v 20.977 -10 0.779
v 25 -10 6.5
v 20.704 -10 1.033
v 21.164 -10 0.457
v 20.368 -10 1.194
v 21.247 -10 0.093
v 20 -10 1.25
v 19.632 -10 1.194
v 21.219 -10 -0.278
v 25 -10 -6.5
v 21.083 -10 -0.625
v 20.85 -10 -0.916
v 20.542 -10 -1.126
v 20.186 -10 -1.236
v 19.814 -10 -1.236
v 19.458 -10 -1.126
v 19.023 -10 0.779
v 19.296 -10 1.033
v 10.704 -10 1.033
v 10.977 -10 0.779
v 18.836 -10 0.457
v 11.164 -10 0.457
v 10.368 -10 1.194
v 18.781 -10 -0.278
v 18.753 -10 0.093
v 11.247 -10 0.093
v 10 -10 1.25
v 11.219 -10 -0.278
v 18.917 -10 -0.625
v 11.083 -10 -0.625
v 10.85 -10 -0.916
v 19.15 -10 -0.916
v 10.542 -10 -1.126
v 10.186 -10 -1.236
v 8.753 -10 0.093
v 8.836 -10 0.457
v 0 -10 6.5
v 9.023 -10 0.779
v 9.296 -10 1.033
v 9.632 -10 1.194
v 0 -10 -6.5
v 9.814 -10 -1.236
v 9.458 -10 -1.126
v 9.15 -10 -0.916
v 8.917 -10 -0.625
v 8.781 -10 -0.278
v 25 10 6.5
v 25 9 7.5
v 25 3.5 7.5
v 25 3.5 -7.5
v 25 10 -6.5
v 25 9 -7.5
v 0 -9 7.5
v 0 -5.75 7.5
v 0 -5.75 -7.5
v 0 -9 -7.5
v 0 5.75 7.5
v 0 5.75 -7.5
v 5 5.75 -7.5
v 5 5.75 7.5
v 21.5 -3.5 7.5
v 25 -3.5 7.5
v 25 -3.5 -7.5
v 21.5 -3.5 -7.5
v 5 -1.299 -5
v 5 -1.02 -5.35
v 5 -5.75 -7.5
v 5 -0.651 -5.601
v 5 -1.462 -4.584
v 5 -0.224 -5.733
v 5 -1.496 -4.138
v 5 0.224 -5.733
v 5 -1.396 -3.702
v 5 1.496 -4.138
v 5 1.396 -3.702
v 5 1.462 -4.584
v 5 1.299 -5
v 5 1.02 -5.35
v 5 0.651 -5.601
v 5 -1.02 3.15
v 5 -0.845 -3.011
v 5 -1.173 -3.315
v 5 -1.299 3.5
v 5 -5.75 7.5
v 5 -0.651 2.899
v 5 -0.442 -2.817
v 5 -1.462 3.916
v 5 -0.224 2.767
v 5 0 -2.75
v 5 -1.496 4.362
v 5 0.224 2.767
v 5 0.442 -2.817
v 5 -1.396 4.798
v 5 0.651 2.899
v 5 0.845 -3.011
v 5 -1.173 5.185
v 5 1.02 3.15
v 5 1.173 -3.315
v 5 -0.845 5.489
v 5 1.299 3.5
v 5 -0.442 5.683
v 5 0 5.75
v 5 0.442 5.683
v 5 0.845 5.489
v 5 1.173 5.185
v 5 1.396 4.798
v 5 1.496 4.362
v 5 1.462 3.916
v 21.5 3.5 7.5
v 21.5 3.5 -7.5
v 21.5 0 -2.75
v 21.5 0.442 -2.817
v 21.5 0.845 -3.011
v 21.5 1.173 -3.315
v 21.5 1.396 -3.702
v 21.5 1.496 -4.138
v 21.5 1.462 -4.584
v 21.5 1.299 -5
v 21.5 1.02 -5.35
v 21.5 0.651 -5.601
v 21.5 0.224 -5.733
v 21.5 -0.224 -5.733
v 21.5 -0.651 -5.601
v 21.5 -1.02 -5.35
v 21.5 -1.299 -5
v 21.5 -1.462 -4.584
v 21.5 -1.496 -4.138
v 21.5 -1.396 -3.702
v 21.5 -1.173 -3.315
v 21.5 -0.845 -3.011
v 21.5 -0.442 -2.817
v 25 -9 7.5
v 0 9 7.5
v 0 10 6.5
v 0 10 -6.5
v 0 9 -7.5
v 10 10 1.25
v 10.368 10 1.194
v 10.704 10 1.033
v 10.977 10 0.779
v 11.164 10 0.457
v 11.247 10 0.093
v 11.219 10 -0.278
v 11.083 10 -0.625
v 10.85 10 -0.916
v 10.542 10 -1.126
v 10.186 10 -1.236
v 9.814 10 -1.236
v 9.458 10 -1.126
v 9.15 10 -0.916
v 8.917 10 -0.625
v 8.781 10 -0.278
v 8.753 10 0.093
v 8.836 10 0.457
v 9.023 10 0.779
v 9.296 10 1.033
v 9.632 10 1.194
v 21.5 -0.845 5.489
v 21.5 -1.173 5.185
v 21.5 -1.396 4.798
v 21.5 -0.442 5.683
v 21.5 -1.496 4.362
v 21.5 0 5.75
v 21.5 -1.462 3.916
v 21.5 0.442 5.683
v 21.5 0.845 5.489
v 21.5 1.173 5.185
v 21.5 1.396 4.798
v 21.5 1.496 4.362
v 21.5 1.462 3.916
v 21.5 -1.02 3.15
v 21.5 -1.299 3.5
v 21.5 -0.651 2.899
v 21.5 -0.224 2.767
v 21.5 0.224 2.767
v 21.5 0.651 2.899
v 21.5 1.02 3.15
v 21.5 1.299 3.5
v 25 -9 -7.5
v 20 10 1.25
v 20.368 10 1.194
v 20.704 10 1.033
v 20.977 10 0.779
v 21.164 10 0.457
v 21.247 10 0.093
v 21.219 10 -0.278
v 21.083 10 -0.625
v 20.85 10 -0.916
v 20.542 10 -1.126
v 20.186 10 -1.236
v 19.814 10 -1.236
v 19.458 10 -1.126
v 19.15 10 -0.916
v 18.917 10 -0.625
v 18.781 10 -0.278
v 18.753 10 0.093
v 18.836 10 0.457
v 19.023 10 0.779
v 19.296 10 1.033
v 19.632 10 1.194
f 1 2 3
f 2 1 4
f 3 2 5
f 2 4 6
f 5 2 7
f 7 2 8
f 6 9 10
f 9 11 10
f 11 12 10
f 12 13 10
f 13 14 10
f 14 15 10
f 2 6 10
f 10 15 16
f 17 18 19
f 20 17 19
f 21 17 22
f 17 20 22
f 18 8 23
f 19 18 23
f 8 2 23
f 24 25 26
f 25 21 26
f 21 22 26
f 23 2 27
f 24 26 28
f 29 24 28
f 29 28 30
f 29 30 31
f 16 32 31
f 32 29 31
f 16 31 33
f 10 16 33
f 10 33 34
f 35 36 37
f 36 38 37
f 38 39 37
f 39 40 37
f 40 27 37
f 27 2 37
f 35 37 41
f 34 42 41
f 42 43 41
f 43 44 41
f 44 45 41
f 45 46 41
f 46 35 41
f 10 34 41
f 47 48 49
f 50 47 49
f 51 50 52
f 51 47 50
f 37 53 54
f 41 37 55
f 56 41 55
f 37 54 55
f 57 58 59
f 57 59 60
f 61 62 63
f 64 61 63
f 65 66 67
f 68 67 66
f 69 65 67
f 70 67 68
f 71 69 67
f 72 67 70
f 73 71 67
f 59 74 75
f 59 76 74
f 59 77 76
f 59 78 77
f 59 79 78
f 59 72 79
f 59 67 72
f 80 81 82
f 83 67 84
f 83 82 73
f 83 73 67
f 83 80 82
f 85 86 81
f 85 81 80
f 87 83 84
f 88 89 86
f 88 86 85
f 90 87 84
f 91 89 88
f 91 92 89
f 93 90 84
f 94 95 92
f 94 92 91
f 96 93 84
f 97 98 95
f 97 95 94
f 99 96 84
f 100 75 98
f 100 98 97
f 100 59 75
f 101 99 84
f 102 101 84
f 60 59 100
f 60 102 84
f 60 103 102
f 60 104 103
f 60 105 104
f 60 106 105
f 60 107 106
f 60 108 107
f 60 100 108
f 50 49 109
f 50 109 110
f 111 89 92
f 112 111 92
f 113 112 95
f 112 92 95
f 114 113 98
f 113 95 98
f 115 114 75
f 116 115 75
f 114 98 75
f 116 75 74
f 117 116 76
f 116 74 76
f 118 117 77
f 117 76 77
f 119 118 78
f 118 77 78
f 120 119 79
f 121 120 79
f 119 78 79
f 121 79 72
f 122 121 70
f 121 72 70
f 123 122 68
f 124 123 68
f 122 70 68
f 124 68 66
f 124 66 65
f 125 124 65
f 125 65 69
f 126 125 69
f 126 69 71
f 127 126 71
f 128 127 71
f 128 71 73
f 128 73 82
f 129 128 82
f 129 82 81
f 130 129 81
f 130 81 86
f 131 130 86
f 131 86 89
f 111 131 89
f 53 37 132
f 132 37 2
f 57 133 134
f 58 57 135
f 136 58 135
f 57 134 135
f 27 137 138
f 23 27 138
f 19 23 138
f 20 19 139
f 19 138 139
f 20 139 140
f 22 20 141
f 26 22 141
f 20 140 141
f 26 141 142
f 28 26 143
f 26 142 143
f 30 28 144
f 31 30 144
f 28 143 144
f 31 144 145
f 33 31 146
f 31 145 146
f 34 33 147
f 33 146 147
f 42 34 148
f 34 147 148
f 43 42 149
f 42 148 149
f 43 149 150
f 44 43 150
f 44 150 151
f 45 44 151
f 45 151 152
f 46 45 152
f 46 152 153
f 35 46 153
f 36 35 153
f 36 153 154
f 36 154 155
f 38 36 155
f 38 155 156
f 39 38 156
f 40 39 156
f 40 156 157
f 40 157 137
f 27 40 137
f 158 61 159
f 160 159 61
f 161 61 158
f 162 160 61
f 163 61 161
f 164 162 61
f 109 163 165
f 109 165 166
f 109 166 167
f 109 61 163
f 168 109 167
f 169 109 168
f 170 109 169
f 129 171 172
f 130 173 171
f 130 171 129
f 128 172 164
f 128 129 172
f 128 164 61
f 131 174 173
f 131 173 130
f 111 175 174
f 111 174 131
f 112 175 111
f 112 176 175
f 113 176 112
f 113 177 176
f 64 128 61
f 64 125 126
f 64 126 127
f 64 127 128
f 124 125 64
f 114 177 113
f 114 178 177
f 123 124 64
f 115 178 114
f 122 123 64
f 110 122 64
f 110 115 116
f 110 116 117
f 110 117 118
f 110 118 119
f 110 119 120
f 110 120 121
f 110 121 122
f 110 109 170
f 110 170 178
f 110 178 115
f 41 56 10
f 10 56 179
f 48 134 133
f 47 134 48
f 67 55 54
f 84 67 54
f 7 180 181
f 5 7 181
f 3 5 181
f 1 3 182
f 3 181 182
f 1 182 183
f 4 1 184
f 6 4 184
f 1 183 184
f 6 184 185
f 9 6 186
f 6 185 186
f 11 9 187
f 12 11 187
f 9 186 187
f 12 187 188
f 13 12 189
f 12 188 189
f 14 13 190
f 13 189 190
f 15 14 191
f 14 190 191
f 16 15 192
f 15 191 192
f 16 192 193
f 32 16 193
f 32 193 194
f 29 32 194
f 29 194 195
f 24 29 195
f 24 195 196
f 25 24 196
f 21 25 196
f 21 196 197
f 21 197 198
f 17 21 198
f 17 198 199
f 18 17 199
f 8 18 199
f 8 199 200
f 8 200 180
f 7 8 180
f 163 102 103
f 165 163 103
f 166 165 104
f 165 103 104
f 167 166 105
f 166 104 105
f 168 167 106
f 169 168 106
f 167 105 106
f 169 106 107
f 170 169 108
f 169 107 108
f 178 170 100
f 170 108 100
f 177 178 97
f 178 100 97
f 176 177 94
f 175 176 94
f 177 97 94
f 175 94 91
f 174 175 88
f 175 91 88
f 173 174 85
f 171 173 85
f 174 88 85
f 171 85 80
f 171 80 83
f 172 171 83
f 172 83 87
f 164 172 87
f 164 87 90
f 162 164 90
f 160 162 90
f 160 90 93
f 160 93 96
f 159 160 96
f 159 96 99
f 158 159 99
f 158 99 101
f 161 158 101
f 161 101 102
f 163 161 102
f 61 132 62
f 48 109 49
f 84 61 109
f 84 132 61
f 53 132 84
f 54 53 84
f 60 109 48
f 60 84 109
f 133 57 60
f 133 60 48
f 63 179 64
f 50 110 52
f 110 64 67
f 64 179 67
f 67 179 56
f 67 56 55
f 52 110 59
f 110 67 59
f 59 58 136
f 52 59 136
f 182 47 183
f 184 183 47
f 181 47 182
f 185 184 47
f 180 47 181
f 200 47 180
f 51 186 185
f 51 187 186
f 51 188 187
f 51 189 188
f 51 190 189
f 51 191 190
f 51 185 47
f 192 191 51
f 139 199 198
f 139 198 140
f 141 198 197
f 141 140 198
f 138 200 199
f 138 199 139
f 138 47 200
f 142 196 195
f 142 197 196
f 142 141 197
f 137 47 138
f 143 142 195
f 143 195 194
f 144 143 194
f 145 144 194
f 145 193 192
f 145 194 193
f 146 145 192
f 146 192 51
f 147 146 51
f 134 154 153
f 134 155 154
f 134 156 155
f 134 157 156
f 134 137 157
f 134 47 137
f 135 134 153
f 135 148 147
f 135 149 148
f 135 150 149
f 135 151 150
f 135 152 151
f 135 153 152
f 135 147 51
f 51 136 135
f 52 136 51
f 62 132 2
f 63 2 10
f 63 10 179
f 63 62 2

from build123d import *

# Parameters (mm, degrees)
SKETCH_1_W          = 15
SKETCH_1_H          = 20
EXTRUDE_1_DEPTH     = 25
SKETCH_2_W          = 15
SKETCH_2_H          = 11.5
CUT_EXTRUDE_1_DEPTH = 5
SKETCH_3_R          = 1.5
CUT_EXTRUDE_2_DEPTH = 24.58495283
SKETCH_4_R          = 1.25
CUT_EXTRUDE_3_DEPTH = 33.882366095
CHAMFER_1_SIZE      = 1
SKETCH_5_W          = 15
SKETCH_5_H          = 7
CUT_EXTRUDE_4_DEPTH = 3.5


with BuildPart() as part:
    # 草图1 → 凸台-拉伸1 (new body)
    with BuildSketch(Plane(origin=(0, 0, 0), x_dir=(0, 0, -1), z_dir=(1, 0, 0))):
        Rectangle(SKETCH_1_W, SKETCH_1_H)
    extrude(amount=EXTRUDE_1_DEPTH)

    # 草图2 → 切除-拉伸1 (cut)
    with BuildSketch(Plane.ZY):
        Rectangle(SKETCH_2_W, SKETCH_2_H)
    extrude(amount=-CUT_EXTRUDE_1_DEPTH, mode=Mode.SUBTRACT)

    # 草图3 → 切除-拉伸2 (cut, through all)
    with BuildSketch(Plane.ZY.offset(-5)):
        with Locations((-4.25, 0)):
            Circle(SKETCH_3_R)
        with Locations((4.25, 0)):
            Circle(SKETCH_3_R)
    extrude(amount=-CUT_EXTRUDE_2_DEPTH, mode=Mode.SUBTRACT)

    # 草图4 → 切除-拉伸3 (cut, through all)
    with BuildSketch(Plane(origin=(0, 10, 0), x_dir=(1, 0, 0), z_dir=(0, 1, 0))):
        with Locations(Location((20, 0, 0), (0, 0, 270))):
            Circle(SKETCH_4_R)
        with Locations(Location((10, 0, 0), (0, 0, 270))):
            Circle(SKETCH_4_R)
    extrude(amount=-CUT_EXTRUDE_3_DEPTH, mode=Mode.SUBTRACT)

    # 倒角1
    chamfer_1_edges = [part.edges().sort_by_distance(p)[0] for p in [
        (12.5, 10, 7.5),
        (12.5, 10, -7.5),
        (12.5, -10, -7.5),
        (12.5, -10, 7.5),
    ]]
    chamfer(chamfer_1_edges, length=CHAMFER_1_SIZE)

    # 草图5 → 切除-拉伸4 (cut)
    with BuildSketch(Plane(origin=(25, 0, 0), x_dir=(0, 0, -1), z_dir=(1, 0, 0))):
        Rectangle(SKETCH_5_W, SKETCH_5_H)
    extrude(amount=-CUT_EXTRUDE_4_DEPTH, mode=Mode.SUBTRACT)


solid = part.part
